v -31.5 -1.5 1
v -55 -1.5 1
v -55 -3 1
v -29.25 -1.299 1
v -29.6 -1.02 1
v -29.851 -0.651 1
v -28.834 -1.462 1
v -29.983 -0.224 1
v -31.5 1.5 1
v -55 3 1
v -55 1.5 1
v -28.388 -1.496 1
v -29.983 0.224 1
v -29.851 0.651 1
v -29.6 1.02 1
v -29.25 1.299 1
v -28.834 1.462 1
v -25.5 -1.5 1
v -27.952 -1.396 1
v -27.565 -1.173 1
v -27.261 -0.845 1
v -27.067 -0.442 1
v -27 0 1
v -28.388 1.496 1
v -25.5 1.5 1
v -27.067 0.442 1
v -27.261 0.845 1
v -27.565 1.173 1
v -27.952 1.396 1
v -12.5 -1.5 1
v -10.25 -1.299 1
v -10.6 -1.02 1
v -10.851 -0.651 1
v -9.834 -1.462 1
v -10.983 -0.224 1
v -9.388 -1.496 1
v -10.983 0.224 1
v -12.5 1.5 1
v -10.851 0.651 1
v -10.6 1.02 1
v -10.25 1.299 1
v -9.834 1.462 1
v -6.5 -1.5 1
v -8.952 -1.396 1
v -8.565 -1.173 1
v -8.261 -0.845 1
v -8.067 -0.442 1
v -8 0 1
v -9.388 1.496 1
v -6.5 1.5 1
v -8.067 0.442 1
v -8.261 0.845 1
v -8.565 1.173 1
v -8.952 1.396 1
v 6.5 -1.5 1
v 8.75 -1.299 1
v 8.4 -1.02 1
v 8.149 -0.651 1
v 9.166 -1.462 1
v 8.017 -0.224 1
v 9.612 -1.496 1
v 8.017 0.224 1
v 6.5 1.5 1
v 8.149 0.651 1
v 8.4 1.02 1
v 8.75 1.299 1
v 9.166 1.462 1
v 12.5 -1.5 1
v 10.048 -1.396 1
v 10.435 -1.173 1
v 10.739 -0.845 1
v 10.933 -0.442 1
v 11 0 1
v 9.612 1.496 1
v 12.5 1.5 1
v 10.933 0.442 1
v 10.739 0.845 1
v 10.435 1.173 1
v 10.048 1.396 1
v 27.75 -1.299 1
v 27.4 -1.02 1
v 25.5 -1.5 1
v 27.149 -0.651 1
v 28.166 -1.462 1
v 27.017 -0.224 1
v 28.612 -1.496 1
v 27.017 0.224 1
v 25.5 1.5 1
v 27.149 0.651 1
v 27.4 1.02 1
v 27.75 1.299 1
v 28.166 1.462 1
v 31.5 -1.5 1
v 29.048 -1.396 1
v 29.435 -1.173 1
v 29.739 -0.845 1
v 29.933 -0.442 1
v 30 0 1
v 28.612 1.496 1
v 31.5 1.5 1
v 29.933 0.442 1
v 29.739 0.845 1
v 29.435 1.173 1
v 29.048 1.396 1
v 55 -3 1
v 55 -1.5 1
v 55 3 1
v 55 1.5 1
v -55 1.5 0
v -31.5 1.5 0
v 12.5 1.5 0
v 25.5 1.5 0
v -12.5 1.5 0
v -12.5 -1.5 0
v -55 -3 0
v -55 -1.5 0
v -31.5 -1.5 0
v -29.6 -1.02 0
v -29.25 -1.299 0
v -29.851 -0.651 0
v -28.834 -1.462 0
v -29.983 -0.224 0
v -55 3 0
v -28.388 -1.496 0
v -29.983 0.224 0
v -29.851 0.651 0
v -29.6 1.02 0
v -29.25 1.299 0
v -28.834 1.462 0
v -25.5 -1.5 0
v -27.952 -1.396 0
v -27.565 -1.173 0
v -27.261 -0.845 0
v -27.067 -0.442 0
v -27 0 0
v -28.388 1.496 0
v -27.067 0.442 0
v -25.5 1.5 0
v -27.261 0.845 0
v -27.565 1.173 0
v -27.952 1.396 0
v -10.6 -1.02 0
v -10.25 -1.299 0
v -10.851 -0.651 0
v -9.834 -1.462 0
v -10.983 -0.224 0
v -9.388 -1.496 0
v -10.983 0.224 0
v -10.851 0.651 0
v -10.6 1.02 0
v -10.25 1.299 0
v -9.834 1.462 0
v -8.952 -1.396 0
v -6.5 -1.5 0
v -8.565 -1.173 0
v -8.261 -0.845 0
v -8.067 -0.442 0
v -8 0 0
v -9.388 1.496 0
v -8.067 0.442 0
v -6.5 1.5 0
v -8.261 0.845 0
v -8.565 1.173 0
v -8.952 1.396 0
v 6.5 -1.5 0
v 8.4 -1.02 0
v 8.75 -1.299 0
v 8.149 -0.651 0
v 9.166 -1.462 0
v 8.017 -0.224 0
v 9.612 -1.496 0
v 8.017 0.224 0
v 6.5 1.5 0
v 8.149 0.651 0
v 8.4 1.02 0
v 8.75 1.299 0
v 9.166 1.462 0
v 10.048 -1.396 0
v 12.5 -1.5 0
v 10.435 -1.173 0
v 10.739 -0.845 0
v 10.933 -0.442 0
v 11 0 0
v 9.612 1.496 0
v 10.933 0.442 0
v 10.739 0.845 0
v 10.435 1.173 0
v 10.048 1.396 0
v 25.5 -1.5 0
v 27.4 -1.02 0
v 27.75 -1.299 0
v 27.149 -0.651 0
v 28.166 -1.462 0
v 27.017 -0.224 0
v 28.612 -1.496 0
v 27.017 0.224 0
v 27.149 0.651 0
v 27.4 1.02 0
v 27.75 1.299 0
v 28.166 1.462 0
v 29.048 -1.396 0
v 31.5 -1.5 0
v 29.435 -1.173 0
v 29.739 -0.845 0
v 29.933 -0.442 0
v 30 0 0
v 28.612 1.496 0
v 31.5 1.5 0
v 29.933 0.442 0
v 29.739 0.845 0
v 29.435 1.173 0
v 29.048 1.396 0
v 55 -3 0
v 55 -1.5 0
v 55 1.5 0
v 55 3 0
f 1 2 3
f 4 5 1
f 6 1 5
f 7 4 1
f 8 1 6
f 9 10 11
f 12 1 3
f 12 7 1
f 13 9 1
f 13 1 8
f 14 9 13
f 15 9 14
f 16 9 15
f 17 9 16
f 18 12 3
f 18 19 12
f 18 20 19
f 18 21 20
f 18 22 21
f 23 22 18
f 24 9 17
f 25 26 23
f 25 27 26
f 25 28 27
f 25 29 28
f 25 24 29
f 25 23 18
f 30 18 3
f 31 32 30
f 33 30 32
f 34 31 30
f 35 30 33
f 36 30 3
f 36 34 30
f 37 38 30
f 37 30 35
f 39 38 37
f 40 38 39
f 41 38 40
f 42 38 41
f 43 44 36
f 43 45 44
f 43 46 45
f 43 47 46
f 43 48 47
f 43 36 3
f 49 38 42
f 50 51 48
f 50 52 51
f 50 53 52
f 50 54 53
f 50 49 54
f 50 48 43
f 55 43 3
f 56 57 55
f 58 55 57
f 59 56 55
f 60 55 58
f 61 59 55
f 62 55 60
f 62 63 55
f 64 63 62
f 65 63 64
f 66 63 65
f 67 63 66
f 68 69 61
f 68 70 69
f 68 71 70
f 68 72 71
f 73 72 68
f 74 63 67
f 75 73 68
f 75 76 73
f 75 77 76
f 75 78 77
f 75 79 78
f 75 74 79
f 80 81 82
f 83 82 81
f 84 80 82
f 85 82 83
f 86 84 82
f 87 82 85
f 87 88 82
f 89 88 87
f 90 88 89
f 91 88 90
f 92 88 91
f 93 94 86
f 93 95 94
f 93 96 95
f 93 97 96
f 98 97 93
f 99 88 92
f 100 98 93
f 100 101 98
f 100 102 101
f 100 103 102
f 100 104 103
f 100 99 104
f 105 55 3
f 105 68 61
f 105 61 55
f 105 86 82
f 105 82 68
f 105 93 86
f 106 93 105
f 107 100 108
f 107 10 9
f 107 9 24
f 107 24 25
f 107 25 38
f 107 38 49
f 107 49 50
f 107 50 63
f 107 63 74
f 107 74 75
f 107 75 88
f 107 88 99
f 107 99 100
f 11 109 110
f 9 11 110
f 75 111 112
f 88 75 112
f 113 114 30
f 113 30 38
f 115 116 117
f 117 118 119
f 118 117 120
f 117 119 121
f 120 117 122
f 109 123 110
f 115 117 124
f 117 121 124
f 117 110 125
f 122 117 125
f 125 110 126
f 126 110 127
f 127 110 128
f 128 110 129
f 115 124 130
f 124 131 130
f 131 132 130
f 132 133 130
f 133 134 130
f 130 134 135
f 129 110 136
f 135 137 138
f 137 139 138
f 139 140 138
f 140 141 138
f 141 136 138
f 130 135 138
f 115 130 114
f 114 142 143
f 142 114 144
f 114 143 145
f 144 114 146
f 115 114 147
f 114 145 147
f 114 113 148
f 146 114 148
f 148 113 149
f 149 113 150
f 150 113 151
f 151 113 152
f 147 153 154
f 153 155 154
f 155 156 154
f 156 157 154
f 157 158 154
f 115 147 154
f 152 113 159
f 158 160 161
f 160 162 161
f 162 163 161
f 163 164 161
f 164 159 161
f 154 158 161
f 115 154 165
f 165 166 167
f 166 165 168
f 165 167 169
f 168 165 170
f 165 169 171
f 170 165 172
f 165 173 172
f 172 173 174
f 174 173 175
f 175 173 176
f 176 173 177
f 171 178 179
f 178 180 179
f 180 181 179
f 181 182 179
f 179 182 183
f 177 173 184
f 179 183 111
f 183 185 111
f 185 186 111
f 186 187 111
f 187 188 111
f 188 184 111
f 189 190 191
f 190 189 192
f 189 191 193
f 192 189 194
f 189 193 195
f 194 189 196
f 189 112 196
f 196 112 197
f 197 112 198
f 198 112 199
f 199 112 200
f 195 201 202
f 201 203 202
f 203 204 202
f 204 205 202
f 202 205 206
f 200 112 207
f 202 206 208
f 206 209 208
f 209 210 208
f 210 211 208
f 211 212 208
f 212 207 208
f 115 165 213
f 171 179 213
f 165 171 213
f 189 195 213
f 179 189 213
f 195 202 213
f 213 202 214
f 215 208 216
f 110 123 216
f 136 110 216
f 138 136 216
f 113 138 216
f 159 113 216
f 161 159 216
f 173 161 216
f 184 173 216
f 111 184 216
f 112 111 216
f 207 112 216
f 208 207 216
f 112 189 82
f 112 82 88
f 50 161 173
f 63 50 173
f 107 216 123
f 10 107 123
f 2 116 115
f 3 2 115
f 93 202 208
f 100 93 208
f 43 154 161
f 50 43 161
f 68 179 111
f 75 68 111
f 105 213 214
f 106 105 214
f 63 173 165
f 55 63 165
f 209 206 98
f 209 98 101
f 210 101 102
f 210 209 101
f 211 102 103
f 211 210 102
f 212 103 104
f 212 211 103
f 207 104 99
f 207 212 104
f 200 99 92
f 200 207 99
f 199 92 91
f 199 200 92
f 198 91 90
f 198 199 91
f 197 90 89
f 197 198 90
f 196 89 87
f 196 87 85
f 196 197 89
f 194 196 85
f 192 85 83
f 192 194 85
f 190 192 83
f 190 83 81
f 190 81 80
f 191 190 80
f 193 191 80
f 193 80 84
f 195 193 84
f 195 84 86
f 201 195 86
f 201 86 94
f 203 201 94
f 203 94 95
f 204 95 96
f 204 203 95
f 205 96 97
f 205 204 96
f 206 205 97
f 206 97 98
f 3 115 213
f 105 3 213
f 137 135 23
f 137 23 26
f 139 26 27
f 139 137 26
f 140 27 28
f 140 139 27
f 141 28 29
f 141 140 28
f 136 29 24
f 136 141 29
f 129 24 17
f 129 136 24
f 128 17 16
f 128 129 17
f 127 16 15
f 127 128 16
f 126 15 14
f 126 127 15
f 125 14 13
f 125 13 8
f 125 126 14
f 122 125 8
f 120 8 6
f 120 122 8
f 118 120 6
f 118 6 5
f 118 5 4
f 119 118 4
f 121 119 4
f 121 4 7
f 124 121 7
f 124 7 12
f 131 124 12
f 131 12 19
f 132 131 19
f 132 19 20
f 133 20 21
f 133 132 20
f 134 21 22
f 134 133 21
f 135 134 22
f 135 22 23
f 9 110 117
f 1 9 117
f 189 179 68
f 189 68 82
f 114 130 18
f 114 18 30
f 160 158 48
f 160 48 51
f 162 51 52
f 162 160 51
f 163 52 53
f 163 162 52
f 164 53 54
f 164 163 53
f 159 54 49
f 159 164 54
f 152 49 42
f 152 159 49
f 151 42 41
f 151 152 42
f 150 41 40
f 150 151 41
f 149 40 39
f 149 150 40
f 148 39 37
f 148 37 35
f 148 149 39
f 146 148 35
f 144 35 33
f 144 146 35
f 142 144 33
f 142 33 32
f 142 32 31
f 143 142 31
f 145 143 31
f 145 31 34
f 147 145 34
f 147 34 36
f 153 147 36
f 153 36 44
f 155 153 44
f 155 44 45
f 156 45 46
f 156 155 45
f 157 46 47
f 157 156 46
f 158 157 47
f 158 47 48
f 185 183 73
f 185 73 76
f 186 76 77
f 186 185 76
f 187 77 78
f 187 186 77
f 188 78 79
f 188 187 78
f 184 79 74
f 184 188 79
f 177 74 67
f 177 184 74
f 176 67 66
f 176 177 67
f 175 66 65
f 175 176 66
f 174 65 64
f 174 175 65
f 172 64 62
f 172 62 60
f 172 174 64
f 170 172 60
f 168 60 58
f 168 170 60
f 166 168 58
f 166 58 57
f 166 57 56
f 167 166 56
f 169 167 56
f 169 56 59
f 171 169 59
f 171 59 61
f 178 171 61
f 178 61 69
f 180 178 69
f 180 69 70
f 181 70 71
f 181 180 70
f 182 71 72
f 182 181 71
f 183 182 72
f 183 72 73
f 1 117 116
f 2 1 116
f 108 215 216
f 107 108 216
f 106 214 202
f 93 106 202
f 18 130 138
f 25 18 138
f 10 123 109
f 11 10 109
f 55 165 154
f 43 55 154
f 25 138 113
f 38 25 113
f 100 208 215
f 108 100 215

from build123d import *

# Parameters (mm, degrees)
F0_R     = 1.5
F0_W     = 13
F0_H     = 3
F1_DEPTH = 1


with BuildPart() as f1:
    # F0 (on Top) → F1 (new body)
    with BuildSketch(Plane.XY):
        Polygon((0, 1.5), (0, 3), (-55, 3), (-55, 1.5), (-31.5, 1.5), (-31.5, -1.5), (-55, -1.5), (-55, -3), (0, -3), (0, -1.5), (-6.5, -1.5), (-6.5, 1.5), align=None)
        with Locations((-28.5, 0)):
            Circle(F0_R, mode=Mode.SUBTRACT)
        with Locations((-19, 0)):
            Rectangle(F0_W, F0_H, mode=Mode.SUBTRACT)
        with Locations((-9.5, 0)):
            Circle(F0_R, mode=Mode.SUBTRACT)
        Polygon((55, 3), (0, 3), (0, 1.5), (6.5, 1.5), (6.5, -1.5), (0, -1.5), (0, -3), (55, -3), (55, -1.5), (31.5, -1.5), (31.5, 1.5), (55, 1.5), align=None)
        with Locations((9.5, 0)):
            Circle(F0_R, mode=Mode.SUBTRACT)
        with Locations((19, 0)):
            Rectangle(F0_W, F0_H, mode=Mode.SUBTRACT)
        with Locations((28.5, 0)):
            Circle(F0_R, mode=Mode.SUBTRACT)
    extrude(amount=F1_DEPTH)


solid = f1.part
